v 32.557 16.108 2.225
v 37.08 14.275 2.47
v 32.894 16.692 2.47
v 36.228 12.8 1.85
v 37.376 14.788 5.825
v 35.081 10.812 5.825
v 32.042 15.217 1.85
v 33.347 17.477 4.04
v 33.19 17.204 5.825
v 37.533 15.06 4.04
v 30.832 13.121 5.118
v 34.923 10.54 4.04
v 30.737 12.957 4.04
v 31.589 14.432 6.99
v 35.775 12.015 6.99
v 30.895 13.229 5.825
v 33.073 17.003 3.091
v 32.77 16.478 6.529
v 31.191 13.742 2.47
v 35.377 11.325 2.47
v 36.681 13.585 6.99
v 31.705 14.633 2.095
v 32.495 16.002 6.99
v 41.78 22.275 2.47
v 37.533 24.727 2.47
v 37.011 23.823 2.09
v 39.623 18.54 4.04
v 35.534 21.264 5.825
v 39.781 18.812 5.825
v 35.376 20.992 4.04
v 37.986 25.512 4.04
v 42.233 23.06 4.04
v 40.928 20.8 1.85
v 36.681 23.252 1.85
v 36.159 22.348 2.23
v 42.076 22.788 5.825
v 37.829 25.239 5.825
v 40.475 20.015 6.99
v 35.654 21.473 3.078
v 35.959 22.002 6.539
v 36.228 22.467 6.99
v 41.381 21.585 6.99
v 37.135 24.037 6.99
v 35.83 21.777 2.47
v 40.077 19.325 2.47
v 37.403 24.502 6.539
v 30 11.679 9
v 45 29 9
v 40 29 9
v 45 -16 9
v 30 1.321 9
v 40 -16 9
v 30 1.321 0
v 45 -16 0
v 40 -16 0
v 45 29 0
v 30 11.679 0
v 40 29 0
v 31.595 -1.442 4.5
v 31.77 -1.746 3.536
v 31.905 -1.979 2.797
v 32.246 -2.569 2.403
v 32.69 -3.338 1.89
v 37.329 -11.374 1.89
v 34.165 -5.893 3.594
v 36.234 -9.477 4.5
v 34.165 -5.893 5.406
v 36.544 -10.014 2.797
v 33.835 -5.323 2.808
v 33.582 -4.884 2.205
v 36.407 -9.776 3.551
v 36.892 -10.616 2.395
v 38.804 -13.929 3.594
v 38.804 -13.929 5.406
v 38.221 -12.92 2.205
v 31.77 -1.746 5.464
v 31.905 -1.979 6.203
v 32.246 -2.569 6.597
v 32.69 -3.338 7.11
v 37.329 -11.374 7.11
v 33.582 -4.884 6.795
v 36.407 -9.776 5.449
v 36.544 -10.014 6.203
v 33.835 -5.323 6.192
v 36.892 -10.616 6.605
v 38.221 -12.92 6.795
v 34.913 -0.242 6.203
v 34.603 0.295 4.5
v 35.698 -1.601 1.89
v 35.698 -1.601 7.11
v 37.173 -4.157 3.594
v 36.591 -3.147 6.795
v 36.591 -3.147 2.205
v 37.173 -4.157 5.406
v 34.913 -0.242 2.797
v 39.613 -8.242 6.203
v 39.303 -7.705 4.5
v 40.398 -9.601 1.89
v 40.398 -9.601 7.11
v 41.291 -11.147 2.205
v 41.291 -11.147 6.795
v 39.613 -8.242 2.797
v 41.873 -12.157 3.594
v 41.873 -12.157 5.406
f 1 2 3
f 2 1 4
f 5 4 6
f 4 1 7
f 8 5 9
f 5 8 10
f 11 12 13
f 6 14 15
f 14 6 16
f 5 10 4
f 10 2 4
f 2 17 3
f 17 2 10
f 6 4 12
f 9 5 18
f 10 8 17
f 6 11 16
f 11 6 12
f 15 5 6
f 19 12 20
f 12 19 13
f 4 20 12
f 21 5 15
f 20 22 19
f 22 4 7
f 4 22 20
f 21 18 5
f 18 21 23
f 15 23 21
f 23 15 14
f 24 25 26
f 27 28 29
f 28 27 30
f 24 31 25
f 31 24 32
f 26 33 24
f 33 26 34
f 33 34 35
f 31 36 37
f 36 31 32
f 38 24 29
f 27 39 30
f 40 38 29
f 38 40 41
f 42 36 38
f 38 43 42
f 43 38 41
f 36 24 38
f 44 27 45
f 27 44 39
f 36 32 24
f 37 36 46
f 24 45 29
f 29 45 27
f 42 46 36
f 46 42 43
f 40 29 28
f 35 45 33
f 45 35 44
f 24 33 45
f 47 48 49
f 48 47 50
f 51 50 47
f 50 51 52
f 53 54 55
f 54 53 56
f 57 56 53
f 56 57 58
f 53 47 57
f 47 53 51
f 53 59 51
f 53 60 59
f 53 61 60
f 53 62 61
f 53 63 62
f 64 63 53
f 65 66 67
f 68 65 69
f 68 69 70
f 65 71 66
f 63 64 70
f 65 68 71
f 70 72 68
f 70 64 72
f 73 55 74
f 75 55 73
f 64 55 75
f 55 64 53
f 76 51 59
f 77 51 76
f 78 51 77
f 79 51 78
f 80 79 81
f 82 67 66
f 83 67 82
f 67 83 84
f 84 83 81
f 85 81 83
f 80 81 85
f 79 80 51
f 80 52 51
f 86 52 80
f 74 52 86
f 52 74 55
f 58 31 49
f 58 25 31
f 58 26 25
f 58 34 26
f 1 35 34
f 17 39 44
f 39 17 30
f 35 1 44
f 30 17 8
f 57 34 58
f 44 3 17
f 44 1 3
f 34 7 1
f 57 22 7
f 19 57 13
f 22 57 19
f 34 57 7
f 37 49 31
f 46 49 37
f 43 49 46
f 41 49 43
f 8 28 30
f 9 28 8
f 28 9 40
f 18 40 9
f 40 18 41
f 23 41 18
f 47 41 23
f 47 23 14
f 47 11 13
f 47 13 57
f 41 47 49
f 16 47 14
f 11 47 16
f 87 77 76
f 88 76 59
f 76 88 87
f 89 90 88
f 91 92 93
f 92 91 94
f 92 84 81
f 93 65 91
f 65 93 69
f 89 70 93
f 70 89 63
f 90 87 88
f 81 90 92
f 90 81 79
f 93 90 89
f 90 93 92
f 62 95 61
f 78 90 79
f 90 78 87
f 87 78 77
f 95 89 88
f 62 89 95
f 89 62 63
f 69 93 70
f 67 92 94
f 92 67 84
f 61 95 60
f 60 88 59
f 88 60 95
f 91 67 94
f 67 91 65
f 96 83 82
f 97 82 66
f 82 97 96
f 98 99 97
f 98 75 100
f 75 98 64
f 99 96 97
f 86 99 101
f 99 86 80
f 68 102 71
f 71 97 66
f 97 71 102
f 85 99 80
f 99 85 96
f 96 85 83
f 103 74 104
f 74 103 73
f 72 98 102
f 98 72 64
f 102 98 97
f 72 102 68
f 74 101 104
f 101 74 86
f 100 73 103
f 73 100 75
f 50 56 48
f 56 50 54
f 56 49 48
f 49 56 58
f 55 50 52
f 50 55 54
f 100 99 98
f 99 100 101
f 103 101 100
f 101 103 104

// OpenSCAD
z=9; //высота
g=3.5; //глубина дырок 
//фосфор
translate ([25,-46,0]) {
difference () {
translate ([5,30,0])cube ([10,45,z]);
translate ([-5,125,1]) {
translate ([9.3,-62.2,3.5])rotate([0,90,-30])cylinder (4.5+g,2.65,2.65);
translate ([14,-54.2,3.5])rotate([0,90,-30])cylinder (4.5+g,2.65,2.65);
}
translate([-5,30,-1])cylinder(z+2,20,20,$fn=6);
translate([-5,75,-1])cylinder(z+2,20,20,$fn=6);
translate ([4,40,4.5])rotate ([90,0,120])cylinder(4.5+g,2.65,2.65);   
translate ([4+4.7,37.5+-9+g,4.5])rotate ([90,0,120])cylinder(4.5+3.5,2.65,2.65); 
  }
//вырезание дырки из доп части от фосфра
difference () {
translate ([15,30,0])cube ([5,45,z]);
translate ([-5,125,1]) {
translate ([9.3,-62.2,3.5])rotate([0,90,-30])cylinder (4.5+g,2.65,2.65);
translate ([14,-54.2,3.5])rotate([0,90,-30])cylinder (4.5+g,2.65,2.65);
}
translate ([9.7-5,-9+g,0]) {
translate ([4,37.5,4.5])rotate ([90,0,120])cylinder(4.5+g,2.65,2.65); 
  }
 }
}

     
